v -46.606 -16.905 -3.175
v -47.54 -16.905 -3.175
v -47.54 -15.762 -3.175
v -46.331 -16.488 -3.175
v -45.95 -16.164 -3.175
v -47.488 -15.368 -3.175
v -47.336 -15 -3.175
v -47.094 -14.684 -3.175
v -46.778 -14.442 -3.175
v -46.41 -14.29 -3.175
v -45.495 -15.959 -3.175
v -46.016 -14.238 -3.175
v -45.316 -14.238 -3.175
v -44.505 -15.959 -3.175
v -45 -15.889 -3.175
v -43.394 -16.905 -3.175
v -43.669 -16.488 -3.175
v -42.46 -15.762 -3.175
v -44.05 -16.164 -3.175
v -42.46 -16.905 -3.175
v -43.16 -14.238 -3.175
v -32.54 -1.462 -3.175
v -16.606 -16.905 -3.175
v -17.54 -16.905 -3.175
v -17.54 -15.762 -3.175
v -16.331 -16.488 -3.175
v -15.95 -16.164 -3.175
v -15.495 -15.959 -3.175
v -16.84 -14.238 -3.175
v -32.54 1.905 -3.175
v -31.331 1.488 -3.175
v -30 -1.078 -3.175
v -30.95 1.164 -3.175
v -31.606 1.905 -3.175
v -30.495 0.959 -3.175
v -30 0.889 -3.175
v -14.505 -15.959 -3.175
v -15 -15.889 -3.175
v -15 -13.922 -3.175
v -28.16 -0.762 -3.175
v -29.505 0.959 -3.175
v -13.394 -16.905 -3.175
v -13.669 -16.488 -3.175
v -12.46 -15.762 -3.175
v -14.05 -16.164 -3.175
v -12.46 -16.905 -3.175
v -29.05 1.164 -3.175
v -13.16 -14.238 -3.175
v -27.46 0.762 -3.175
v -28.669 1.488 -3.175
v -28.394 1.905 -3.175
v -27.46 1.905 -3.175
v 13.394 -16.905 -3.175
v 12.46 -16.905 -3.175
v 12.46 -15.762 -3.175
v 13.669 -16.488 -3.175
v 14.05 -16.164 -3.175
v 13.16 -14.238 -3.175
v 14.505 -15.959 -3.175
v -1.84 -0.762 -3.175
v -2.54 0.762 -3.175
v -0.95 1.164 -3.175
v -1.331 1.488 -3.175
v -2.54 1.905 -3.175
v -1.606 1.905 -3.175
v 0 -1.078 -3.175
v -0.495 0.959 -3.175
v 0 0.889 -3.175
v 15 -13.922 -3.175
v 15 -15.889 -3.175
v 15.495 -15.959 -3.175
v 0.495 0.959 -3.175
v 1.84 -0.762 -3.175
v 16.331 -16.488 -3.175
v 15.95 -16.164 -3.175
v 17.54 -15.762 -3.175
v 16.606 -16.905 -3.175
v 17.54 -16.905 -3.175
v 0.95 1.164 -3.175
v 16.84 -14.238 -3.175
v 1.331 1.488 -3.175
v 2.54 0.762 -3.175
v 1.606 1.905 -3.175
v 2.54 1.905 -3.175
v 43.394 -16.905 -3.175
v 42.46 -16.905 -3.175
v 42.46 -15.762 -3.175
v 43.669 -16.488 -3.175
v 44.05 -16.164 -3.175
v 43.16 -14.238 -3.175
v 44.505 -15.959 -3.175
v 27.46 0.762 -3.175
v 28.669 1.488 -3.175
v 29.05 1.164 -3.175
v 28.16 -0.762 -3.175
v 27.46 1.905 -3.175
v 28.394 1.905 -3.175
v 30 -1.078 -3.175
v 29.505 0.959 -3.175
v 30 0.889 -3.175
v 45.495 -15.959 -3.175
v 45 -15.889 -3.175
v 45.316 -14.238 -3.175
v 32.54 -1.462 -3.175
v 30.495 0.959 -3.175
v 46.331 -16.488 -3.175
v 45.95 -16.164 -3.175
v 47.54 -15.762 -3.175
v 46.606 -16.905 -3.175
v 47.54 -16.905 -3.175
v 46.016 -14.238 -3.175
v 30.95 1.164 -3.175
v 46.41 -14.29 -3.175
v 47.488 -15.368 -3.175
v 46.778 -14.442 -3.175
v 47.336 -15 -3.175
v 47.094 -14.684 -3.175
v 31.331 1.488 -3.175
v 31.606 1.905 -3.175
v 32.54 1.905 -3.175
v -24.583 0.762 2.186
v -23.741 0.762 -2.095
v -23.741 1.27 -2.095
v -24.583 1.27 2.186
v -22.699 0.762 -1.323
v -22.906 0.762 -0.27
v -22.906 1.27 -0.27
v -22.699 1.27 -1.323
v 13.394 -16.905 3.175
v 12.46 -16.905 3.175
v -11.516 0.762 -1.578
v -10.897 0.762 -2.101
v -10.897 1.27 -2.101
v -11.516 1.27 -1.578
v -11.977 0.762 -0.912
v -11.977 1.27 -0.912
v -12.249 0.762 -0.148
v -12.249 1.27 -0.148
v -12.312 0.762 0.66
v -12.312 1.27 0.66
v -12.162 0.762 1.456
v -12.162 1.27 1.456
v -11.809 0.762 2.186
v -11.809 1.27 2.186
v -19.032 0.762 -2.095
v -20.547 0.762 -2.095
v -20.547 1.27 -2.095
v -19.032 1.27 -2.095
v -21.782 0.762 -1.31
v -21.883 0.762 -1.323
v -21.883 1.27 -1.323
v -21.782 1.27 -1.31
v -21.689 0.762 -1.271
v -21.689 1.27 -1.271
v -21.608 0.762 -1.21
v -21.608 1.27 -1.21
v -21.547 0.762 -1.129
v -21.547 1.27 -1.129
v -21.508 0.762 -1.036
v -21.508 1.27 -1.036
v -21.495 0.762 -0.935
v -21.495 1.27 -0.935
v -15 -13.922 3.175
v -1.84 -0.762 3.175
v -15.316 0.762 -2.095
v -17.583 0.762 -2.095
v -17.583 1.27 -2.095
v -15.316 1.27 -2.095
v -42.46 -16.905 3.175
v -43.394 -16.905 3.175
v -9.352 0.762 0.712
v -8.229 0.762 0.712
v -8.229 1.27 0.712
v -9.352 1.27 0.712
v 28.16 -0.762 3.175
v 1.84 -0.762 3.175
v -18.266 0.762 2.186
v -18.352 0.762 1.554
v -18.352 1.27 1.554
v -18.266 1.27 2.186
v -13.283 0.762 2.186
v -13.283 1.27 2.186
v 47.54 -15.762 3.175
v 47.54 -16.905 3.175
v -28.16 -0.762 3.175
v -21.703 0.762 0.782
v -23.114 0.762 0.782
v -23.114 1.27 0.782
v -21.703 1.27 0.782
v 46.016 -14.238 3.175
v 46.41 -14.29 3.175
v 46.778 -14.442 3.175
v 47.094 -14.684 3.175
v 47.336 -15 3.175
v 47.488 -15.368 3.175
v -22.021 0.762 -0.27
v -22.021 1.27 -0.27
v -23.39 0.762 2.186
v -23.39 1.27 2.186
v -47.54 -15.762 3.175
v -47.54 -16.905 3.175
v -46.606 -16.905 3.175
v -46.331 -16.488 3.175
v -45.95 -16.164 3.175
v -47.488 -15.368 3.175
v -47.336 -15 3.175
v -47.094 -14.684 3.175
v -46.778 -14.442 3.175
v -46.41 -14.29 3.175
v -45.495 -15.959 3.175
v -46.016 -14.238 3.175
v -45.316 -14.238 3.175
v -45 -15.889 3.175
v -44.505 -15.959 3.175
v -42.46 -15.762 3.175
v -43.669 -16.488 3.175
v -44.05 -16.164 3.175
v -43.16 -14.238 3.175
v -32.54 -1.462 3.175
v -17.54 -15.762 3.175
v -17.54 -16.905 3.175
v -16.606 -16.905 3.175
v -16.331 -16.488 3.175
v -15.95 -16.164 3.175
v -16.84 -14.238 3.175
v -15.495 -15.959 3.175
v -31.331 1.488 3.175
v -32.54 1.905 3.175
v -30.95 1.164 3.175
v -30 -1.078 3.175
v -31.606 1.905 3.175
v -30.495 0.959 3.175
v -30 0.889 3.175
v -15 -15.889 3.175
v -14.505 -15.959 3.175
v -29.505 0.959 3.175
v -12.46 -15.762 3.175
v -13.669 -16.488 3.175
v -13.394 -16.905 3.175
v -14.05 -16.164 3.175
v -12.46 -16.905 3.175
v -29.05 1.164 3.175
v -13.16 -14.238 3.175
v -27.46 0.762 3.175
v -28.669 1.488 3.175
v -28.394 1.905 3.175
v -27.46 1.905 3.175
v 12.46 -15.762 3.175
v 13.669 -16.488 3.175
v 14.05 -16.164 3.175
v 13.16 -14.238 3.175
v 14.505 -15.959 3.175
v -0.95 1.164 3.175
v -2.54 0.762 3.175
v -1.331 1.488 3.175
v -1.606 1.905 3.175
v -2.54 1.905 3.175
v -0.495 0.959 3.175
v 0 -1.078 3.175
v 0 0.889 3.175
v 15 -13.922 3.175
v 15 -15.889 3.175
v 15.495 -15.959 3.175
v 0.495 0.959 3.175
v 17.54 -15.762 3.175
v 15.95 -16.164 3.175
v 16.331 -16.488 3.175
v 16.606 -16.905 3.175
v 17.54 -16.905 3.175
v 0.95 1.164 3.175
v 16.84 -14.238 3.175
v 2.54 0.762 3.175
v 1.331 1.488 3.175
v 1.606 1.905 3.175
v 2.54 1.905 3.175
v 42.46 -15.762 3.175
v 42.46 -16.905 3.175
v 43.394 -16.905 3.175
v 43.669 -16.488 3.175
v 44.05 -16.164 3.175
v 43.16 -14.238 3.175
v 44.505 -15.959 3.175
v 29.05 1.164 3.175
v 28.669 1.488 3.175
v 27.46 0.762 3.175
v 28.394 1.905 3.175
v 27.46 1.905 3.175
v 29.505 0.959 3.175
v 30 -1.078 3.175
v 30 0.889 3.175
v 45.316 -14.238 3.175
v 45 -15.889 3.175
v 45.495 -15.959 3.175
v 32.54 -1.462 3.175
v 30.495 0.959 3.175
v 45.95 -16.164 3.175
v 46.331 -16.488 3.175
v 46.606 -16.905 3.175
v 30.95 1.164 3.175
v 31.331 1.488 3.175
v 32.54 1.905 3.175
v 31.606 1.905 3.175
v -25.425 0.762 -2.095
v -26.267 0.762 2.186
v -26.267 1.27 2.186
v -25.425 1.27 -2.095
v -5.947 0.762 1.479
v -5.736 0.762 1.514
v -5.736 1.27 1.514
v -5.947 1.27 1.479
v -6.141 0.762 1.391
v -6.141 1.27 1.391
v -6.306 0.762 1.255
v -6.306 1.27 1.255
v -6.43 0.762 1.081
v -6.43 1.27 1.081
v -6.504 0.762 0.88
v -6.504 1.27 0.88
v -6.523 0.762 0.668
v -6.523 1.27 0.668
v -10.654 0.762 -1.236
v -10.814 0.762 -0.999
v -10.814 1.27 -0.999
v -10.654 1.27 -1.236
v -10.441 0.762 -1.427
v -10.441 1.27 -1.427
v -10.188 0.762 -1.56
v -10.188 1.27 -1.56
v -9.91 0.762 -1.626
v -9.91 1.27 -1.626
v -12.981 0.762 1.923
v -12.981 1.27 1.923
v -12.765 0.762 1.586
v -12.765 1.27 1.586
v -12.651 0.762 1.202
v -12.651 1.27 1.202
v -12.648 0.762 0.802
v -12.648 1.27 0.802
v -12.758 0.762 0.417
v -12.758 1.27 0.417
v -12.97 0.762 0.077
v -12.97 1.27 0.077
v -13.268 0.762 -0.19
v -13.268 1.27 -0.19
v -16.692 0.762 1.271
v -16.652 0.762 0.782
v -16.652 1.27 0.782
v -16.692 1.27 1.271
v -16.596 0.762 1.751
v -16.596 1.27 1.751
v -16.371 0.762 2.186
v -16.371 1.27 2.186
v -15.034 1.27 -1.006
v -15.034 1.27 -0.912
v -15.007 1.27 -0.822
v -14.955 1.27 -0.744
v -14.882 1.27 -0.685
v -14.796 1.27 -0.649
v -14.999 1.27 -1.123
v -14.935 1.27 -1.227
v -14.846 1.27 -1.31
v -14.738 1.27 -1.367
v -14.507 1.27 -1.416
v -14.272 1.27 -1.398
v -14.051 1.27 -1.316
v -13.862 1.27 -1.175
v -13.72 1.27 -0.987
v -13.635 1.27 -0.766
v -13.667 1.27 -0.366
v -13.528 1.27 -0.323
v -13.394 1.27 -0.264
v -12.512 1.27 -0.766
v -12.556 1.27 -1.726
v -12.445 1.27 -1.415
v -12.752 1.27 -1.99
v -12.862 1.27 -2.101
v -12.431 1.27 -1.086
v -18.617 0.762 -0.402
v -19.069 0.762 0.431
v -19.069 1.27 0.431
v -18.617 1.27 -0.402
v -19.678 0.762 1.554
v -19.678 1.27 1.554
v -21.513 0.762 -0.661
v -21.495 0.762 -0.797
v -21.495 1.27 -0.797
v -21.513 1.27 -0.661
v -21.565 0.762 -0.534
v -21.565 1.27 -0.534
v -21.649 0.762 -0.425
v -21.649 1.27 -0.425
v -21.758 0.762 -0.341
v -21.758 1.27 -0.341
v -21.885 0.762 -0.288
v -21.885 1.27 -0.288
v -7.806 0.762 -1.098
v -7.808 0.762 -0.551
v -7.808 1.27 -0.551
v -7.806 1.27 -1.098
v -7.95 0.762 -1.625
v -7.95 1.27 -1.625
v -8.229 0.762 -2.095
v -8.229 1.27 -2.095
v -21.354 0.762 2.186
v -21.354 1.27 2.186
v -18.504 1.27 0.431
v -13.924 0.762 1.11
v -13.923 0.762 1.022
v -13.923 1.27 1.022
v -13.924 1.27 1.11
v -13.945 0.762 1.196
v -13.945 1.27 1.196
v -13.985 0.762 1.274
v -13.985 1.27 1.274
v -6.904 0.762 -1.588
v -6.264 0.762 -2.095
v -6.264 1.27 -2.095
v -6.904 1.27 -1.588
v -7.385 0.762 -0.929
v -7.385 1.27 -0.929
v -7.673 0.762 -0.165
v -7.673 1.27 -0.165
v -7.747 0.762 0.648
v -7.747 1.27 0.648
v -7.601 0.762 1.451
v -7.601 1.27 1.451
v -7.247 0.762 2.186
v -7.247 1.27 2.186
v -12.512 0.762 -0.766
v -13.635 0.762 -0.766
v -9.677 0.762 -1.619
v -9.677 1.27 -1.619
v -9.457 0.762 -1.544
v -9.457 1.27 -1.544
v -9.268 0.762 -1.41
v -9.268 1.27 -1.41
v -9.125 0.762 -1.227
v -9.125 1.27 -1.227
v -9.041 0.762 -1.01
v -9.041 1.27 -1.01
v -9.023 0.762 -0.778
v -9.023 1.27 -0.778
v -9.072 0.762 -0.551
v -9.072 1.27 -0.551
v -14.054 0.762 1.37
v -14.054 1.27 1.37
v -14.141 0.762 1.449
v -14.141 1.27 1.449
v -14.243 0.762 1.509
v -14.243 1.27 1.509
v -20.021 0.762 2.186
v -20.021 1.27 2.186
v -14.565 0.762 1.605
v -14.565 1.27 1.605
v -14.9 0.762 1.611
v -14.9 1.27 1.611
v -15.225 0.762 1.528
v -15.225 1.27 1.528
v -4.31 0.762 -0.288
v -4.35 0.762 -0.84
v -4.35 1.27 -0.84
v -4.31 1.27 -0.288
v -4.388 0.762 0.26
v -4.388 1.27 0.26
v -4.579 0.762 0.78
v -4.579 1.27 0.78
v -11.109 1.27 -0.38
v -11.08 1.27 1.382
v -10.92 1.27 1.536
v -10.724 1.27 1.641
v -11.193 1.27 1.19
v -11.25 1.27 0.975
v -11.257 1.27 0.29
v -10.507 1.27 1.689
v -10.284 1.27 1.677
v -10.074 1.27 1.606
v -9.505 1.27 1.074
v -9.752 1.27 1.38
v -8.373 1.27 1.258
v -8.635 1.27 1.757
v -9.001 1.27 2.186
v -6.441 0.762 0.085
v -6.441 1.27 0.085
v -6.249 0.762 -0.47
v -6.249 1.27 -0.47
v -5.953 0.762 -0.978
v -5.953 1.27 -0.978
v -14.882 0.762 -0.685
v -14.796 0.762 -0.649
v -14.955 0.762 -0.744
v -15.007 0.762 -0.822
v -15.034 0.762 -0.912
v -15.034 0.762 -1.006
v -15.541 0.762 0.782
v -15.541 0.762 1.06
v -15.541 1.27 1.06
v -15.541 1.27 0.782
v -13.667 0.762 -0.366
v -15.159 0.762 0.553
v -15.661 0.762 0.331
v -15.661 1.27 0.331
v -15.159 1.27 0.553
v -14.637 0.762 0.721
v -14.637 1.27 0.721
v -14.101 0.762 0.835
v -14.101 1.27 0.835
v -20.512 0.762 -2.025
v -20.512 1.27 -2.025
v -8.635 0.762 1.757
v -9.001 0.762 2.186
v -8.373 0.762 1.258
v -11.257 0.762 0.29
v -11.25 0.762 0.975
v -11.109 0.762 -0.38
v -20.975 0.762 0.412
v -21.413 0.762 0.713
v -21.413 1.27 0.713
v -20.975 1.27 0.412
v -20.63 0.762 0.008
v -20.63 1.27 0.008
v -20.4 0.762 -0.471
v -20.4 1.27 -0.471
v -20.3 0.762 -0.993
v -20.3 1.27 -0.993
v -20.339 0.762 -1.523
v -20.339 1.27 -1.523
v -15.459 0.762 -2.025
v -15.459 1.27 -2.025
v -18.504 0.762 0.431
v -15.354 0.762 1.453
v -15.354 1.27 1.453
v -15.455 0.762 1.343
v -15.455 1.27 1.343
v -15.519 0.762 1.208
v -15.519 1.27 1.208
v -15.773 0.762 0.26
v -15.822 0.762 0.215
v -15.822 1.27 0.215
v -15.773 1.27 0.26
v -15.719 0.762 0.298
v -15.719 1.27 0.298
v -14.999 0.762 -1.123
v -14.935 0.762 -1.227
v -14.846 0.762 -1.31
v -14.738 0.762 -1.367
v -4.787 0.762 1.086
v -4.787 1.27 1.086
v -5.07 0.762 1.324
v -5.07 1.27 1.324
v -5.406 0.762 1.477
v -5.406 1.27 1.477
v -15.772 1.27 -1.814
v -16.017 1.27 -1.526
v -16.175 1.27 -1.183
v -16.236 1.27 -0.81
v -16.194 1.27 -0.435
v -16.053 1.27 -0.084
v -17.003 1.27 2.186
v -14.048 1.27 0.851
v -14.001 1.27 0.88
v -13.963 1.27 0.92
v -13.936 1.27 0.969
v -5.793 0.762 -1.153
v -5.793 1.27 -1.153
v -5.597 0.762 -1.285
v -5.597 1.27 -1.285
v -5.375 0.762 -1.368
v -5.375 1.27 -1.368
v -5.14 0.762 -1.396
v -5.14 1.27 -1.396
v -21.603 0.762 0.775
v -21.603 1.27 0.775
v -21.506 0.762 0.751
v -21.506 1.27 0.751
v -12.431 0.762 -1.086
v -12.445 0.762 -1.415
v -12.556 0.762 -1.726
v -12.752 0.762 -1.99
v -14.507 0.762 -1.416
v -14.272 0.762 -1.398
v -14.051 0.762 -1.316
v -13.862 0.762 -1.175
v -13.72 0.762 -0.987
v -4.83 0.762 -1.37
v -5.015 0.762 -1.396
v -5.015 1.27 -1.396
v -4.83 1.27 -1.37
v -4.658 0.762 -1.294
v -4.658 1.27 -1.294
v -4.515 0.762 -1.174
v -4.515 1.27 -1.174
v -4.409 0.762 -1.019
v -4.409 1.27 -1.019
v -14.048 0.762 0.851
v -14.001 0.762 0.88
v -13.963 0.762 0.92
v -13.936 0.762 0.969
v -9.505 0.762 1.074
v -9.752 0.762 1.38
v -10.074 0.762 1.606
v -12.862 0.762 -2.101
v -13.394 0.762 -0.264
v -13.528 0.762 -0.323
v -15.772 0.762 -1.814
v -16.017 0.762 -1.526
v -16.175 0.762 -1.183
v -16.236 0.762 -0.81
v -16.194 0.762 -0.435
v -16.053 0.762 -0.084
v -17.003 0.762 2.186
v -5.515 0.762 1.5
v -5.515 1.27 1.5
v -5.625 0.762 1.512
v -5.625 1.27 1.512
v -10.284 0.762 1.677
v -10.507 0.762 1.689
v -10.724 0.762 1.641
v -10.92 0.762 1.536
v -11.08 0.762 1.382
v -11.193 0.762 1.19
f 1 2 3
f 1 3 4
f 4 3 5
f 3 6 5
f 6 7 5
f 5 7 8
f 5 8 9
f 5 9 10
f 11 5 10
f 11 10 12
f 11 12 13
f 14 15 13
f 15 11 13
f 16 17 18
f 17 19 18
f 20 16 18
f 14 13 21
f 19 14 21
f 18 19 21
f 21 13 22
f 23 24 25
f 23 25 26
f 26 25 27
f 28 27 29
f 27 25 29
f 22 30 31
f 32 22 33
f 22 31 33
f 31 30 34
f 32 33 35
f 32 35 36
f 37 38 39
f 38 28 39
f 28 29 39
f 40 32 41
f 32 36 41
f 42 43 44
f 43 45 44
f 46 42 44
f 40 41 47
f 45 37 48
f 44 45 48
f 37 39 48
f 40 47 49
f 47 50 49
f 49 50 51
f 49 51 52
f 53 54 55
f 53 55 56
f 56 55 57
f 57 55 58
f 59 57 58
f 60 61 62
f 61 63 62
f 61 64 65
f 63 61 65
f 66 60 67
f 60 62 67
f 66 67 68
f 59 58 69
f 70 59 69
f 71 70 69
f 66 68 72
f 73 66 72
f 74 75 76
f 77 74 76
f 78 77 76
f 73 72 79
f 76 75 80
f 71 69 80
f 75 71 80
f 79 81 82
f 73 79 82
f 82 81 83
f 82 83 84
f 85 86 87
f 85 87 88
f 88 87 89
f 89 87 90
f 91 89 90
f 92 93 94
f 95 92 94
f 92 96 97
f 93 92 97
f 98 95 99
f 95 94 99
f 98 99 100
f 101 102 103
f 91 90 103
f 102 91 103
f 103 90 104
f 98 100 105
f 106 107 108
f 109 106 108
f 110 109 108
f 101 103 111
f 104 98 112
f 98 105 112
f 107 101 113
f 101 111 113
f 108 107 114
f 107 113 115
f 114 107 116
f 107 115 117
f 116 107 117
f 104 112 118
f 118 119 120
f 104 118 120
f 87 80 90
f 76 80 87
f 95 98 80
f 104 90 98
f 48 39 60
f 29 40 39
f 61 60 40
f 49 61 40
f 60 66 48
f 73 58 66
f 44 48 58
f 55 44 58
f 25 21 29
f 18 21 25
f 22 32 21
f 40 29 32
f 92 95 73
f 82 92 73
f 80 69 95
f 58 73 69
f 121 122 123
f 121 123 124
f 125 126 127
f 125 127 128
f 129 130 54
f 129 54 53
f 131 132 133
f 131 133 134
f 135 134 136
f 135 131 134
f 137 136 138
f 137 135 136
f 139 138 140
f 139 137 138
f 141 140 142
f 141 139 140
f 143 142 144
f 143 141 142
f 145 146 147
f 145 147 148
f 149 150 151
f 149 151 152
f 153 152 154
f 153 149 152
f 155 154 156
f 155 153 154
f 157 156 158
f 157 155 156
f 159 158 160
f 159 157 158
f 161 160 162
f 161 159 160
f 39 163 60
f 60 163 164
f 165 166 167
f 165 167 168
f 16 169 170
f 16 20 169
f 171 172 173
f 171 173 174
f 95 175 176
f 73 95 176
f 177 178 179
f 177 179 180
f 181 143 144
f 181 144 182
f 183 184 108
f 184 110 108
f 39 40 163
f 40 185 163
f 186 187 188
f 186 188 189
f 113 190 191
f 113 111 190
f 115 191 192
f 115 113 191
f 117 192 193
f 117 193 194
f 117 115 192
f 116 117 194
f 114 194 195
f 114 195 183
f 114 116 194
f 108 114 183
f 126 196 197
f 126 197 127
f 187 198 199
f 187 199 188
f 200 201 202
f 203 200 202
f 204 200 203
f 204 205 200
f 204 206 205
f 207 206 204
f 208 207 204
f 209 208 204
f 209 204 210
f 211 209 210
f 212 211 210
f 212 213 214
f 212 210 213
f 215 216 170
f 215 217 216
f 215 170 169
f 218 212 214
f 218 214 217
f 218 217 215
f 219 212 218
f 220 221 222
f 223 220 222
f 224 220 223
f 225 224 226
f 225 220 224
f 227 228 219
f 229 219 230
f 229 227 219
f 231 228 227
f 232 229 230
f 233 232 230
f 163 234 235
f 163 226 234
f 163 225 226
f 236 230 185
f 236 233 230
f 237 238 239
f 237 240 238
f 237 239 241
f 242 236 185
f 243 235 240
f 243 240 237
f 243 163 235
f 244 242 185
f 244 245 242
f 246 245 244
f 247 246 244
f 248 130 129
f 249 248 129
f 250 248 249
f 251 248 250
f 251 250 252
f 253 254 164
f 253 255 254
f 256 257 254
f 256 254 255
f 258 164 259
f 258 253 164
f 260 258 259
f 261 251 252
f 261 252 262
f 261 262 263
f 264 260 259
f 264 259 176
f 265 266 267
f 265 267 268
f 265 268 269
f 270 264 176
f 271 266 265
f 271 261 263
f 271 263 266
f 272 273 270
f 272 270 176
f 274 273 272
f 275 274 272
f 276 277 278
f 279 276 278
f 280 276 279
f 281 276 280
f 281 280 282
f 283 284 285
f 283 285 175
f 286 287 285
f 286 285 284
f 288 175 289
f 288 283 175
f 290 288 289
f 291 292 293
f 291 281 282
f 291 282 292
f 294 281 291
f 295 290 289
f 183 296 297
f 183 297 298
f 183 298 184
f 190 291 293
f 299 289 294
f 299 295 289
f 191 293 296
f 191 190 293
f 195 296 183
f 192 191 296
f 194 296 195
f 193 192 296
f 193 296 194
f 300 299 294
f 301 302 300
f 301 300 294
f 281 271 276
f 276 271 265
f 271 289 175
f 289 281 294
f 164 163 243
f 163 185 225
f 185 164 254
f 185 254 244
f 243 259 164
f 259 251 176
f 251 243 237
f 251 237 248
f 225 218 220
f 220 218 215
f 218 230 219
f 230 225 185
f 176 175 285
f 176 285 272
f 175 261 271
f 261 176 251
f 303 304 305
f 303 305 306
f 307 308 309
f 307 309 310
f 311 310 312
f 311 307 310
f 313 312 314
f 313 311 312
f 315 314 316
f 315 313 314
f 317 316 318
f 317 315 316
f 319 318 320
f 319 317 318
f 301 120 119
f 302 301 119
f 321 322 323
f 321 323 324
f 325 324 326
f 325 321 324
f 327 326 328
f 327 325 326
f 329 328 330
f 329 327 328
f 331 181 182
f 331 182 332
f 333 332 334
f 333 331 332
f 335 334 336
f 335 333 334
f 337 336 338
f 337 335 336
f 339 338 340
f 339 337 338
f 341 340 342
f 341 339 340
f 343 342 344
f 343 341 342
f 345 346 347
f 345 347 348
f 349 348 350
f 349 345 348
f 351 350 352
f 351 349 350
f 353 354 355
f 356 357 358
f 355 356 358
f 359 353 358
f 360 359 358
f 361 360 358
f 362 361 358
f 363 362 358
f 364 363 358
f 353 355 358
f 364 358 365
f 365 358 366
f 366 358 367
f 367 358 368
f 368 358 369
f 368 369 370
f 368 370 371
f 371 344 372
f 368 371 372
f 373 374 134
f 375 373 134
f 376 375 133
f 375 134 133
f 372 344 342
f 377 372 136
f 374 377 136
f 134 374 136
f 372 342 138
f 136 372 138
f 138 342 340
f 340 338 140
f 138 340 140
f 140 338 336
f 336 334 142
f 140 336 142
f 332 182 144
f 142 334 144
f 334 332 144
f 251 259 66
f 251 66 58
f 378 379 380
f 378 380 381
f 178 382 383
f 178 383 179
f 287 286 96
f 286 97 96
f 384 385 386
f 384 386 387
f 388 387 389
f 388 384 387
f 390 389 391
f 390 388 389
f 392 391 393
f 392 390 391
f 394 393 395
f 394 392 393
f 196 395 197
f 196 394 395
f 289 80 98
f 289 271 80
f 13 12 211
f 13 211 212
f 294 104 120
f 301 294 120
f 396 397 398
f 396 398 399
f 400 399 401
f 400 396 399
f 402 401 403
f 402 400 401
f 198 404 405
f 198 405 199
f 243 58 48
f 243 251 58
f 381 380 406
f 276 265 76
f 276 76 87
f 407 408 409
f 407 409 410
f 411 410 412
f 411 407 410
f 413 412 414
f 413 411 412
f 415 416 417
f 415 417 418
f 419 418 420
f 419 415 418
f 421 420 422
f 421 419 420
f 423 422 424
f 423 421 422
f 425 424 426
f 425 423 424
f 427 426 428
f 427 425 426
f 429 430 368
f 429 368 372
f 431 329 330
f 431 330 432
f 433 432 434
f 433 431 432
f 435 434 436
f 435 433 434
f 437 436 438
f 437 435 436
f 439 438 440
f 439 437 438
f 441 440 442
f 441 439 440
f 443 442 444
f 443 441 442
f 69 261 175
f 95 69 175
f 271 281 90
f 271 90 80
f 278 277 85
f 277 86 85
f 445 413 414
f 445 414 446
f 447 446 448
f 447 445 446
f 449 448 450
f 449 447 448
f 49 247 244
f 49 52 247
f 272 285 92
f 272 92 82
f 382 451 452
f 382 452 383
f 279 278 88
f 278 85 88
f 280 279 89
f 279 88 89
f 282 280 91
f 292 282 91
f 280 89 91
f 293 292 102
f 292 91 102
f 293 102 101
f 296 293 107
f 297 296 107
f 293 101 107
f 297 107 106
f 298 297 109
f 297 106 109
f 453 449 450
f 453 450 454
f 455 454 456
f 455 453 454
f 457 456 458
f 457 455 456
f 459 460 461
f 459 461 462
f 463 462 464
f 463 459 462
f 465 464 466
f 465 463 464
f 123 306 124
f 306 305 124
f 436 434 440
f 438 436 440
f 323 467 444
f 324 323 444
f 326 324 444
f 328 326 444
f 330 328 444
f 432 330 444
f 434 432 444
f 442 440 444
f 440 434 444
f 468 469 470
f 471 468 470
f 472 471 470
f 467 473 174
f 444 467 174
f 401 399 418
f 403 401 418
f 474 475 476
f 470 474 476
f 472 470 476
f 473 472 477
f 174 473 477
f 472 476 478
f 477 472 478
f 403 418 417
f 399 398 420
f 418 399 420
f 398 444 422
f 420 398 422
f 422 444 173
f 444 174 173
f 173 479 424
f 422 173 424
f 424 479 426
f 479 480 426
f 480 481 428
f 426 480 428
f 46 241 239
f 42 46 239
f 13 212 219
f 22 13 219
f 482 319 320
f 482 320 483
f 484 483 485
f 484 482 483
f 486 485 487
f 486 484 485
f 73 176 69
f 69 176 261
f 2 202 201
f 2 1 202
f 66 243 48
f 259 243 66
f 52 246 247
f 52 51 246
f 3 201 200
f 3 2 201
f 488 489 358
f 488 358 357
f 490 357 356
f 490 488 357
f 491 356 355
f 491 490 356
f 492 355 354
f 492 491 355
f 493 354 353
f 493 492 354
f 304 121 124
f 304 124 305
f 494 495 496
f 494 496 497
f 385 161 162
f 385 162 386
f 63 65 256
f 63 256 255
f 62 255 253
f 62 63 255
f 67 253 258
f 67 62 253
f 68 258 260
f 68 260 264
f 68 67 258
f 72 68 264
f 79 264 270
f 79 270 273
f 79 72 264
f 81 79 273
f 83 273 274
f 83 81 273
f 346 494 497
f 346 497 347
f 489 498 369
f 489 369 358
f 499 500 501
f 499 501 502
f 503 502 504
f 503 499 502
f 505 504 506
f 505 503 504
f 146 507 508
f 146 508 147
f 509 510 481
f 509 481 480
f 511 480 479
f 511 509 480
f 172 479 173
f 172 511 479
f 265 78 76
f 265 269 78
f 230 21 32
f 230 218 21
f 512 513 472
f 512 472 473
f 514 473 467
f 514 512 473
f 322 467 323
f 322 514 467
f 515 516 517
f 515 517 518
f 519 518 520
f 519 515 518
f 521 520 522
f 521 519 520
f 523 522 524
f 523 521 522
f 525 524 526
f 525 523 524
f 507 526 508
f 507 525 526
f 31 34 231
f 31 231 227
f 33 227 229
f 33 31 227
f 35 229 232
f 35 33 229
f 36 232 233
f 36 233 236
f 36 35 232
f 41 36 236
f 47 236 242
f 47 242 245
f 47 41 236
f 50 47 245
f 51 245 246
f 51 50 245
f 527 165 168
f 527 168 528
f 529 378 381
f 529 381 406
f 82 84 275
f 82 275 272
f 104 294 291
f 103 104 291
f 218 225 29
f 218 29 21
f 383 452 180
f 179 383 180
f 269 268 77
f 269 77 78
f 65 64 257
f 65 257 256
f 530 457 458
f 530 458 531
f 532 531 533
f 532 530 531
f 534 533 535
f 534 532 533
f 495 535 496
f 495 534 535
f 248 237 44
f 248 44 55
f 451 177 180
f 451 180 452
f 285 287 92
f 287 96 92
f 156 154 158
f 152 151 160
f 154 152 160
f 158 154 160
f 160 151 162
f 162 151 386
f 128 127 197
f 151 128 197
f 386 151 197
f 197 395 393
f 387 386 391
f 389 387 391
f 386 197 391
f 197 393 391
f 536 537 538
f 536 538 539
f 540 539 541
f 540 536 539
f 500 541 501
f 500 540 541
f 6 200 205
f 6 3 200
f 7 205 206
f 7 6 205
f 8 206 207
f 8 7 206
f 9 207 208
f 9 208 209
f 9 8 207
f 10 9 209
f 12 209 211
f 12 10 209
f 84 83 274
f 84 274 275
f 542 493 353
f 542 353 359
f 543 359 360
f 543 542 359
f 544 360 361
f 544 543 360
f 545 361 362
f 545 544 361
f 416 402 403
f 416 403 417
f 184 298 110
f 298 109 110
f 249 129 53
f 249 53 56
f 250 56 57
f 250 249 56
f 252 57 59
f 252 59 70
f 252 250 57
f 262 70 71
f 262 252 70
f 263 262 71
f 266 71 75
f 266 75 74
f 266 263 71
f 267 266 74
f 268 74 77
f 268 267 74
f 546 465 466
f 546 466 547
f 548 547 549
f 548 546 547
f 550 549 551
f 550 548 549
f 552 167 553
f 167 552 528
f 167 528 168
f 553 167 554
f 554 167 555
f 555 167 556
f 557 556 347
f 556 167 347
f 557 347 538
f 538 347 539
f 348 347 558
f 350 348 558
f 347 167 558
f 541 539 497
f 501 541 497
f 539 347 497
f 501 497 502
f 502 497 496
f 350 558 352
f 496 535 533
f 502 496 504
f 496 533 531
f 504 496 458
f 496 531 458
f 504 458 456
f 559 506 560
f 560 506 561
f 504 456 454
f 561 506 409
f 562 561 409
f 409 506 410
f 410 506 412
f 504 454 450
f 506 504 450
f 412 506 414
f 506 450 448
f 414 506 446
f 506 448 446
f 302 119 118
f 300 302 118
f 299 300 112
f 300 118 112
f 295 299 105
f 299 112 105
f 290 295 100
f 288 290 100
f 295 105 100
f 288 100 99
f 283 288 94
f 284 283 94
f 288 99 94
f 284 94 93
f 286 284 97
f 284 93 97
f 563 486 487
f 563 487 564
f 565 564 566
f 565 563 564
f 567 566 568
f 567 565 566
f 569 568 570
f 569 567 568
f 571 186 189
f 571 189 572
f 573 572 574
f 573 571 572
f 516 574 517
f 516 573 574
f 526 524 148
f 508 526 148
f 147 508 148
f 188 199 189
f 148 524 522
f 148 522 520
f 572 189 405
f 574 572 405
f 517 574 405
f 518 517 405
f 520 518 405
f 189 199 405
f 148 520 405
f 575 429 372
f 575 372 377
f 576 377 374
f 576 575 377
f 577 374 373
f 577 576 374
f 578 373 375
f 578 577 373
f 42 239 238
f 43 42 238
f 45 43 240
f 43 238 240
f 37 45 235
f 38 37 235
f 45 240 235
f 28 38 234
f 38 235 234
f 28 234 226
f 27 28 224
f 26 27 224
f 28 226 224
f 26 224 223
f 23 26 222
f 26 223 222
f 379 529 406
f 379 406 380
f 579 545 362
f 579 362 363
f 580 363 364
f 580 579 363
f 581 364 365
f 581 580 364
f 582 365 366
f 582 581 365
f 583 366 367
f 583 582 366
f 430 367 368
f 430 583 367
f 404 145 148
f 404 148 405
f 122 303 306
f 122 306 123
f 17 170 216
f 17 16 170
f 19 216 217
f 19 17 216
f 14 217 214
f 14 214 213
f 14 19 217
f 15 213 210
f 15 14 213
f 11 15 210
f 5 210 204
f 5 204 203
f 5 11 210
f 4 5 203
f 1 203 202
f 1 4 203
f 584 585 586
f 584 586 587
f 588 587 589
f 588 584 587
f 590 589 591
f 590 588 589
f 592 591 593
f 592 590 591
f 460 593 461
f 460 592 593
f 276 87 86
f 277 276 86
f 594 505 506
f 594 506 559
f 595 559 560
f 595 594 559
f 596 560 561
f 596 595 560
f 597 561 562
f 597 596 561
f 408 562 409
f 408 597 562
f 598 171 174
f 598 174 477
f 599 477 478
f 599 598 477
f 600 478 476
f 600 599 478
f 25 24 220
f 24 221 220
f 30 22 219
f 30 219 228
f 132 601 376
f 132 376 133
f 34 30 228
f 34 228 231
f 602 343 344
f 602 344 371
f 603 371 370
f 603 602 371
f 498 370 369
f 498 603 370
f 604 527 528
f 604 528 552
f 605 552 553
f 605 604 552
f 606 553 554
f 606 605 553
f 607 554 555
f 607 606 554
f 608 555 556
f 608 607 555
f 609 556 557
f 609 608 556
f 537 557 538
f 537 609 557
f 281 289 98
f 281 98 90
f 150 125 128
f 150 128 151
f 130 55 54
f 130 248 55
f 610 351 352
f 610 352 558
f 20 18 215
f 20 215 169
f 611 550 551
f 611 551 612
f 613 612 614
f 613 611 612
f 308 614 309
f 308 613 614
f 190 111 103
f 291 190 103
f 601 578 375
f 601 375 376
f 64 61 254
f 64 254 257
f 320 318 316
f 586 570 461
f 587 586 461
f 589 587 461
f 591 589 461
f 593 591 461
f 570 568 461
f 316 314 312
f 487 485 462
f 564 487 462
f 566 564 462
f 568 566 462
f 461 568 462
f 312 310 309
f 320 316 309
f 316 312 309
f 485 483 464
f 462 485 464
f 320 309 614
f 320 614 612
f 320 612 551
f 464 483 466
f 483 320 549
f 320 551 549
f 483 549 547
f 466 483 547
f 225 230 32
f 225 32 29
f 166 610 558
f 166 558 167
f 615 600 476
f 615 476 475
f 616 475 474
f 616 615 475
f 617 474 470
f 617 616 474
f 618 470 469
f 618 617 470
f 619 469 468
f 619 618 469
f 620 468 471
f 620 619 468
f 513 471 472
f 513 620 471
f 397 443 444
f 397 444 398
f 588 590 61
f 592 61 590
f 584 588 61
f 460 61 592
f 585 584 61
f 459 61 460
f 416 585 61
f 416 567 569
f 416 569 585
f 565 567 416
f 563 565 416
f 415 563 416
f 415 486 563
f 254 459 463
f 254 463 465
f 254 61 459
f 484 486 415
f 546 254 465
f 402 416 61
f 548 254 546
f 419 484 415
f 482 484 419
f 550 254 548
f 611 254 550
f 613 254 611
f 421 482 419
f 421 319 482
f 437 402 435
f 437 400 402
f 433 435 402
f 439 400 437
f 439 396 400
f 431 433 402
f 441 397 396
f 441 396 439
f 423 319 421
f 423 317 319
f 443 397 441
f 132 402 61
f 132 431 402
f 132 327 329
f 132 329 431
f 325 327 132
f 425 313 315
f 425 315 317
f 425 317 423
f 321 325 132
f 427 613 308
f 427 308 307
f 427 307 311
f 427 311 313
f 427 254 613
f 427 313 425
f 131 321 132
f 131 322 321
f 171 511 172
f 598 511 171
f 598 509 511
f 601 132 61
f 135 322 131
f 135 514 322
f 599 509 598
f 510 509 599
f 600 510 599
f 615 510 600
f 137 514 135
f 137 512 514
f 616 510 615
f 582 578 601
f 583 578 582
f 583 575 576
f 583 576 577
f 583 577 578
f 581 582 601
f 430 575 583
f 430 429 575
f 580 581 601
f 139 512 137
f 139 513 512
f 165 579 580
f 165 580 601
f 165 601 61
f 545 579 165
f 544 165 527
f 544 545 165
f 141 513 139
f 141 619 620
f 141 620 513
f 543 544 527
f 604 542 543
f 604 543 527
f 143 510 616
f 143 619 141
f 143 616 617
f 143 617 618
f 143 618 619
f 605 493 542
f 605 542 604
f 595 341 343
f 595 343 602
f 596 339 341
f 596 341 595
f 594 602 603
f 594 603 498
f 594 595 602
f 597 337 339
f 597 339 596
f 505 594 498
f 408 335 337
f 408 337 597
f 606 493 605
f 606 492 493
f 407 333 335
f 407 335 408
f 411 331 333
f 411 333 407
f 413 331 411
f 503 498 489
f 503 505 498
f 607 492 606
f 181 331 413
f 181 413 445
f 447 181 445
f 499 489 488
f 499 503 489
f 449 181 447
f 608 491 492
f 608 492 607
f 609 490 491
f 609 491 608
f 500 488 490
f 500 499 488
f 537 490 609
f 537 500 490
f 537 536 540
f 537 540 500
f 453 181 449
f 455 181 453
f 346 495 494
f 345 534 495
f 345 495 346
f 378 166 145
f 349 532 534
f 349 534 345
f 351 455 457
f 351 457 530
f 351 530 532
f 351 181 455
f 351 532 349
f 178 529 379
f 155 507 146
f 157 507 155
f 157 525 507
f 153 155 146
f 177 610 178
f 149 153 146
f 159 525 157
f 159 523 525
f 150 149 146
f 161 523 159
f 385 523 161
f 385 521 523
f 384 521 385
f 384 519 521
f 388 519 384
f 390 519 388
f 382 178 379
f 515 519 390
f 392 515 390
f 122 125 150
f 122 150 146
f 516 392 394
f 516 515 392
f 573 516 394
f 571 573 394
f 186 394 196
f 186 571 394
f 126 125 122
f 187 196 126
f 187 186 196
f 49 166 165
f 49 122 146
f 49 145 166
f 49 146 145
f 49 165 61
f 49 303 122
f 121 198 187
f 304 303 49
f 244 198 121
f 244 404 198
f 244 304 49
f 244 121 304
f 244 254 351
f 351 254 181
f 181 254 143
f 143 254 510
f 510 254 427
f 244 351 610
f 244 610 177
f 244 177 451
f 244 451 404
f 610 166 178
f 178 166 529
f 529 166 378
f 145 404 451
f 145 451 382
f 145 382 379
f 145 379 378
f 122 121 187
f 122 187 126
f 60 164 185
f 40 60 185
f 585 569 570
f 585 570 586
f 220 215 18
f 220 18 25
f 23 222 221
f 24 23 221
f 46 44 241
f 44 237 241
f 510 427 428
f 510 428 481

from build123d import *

# Parameters (mm, degrees)
BOSS_EXTRUDE1_DEPTH  = 3.175
BOSS_EXTRUDE2_DEPTH  = 3.175
BOSS_EXTRUDE3_START  = -3.175
BOSS_EXTRUDE3_DEPTH  = 6.35
FILLET1_R            = 1.524
FILLET1_OF_MIRROR1_R = 1.524
BOSS_EXTRUDE4_DEPTH  = 0.508


with BuildPart() as part:
    # Sketch1 → Boss-Extrude1 (new body, symmetric)
    with BuildSketch(Plane.XY):
        Polygon((-46.839630735, -15.762), (-30.315630735, 0.762), (0, 0.762), (30.315630735, 0.762), (46.839630735, -15.762), (15, -15.762), (-15, -15.762), align=None)
        Polygon((-43.160369265, -14.238), (-30, -1.077630735), (-16.839630735, -14.238), align=None, mode=Mode.SUBTRACT)
        Polygon((-28.160369265, -0.762), (-15, -13.922369265), (-1.839630735, -0.762), align=None, mode=Mode.SUBTRACT)
        Polygon((-13.160369265, -14.238), (0, -1.077630735), (13.160369265, -14.238), align=None, mode=Mode.SUBTRACT)
        Polygon((1.839630735, -0.762), (15, -13.922369265), (28.160369265, -0.762), align=None, mode=Mode.SUBTRACT)
        Polygon((16.839630735, -14.238), (30, -1.077630735), (43.160369265, -14.238), align=None, mode=Mode.SUBTRACT)
    extrude(amount=BOSS_EXTRUDE1_DEPTH, both=True)

    # Sketch2 → Boss-Extrude2 (add, symmetric)
    with BuildSketch(Plane.XY):
        with BuildLine():
            Line((-46.606437051, -16.905), (-47.54, -16.905))
            Line((-47.54, -16.905), (-47.54, -14.238))
            Line((-47.54, -14.238), (-42.46, -14.238))
            Line((-42.46, -14.238), (-42.46, -16.905))
            Line((-42.46, -16.905), (-43.393562949, -16.905))
            ThreePointArc((-43.393562949, -16.905), (-45, -15.889), (-46.606437051, -16.905))
        make_face()
        with BuildLine():
            Line((-27.46, 0.762), (-30.315630735, 0.762))
            Line((-30.315630735, 0.762), (-32.54, -1.462369265))
            Line((-32.54, -1.462369265), (-32.54, 0.762))
            Line((-32.54, 0.762), (-32.54, 1.905))
            Line((-32.54, 1.905), (-31.606437051, 1.905))
            ThreePointArc((-31.606437051, 1.905), (-30, 0.889), (-28.393562949, 1.905))
            Line((-28.393562949, 1.905), (-27.46, 1.905))
            Line((-27.46, 1.905), (-27.46, 0.762))
        make_face()
        with BuildLine():
            Line((-16.606437051, -16.905), (-17.54, -16.905))
            Line((-17.54, -16.905), (-17.54, -15.762))
            Line((-17.54, -15.762), (-12.46, -15.762))
            Line((-12.46, -15.762), (-12.46, -16.905))
            Line((-12.46, -16.905), (-13.393562949, -16.905))
            ThreePointArc((-13.393562949, -16.905), (-15, -15.889), (-16.606437051, -16.905))
        make_face()
    boss_extrude2 = extrude(amount=BOSS_EXTRUDE2_DEPTH, both=True)

    # Sketch3 → Boss-Extrude3 (add)
    with BuildSketch(Plane.XY.offset(BOSS_EXTRUDE3_START)):
        with BuildLine():
            Line((1.606437051, 1.905), (2.54, 1.905))
            Line((2.54, 1.905), (2.54, 0.762))
            Line((2.54, 0.762), (-2.54, 0.762))
            Line((-2.54, 0.762), (-2.54, 1.905))
            Line((-2.54, 1.905), (-1.606437051, 1.905))
            ThreePointArc((-1.606437051, 1.905), (0, 0.889), (1.606437051, 1.905))
        make_face()
    extrude(amount=BOSS_EXTRUDE3_DEPTH)

    # Fillet1
    fillet1_edges = [part.edges().sort_by_distance(p)[0] for p in [
        (-47.54, -14.238, 0),
    ]]
    fillet(fillet1_edges, radius=FILLET1_R)

    # Mirror1: Boss-Extrude2 across plane
    add(boss_extrude2.mirror(Plane(origin=(0, 0, 0), x_dir=(0, 0, 1), z_dir=(1, 0, 0))))

    # Fillet1 of Mirror1
    fillet1_of_mirror1_edges = [part.edges().sort_by_distance(p)[0] for p in [
        (47.54, -14.238, 0),
    ]]
    fillet(fillet1_of_mirror1_edges, radius=FILLET1_OF_MIRROR1_R)

    # Sketch4 → Boss-Extrude4 (add)
    with BuildSketch(Plane(origin=(30.341470111, 0.762, -10.998323426), x_dir=(-1, 0, 0), z_dir=(0, 1, 0))):
        Polygon((55.766638301, 8.903049935), (54.0821519, 8.903049935), (54.924395101, 13.184452869), (56.608881501, 13.184452869), align=None)
        with BuildLine():
            Line((49.373679321, 8.903049935), (51.695796166, 13.184452869))
            Line((51.695796166, 13.184452869), (53.731217234, 13.184452869))
            Line((53.731217234, 13.184452869), (53.455071922, 11.780714202))
            Line((53.455071922, 11.780714202), (52.044845481, 11.780714202))
            ThreePointArc((52.044845481, 11.780714202), (51.895660414, 11.763021636), (51.754751921, 11.710925494))
            ThreePointArc((51.754751921, 11.710925494), (50.74099205, 10.52746368), (50.853552966, 8.973236868))
            Line((50.853552966, 8.973236868), (50.888554794, 8.903049935))
            Line((50.888554794, 8.903049935), (49.373679321, 8.903049935))
        make_face()
        with BuildLine():
            Line((47.344206299, 13.184452869), (47.92473551, 8.903049935))
            Line((47.92473551, 8.903049935), (45.657455804, 8.903049935))
            Line((45.657455804, 8.903049935), (45.800093765, 8.973236868))
            ThreePointArc((45.800093765, 8.973236868), (46.559919921, 9.999679495), (46.16385217, 11.213784347))
            ThreePointArc((46.16385217, 11.213784347), (46.087708374, 11.278047887), (46.002485287, 11.329668676))
            ThreePointArc((46.002485287, 11.329668676), (45.241879319, 11.641820064), (44.44239948, 11.833632247))
            ThreePointArc((44.44239948, 11.833632247), (44.321830206, 11.897125178), (44.264573877, 12.020777977))
            ThreePointArc((44.264573877, 12.020777977), (44.273299822, 12.151811254), (44.326168164, 12.272022736))
            ThreePointArc((44.326168164, 12.272022736), (44.436687002, 12.409847066), (44.584321098, 12.50687352))
            ThreePointArc((44.584321098, 12.50687352), (45.07356558, 12.617554773), (45.566896159, 12.526805434))
            ThreePointArc((45.566896159, 12.526805434), (45.796502387, 12.340831934), (45.882880346, 12.05826511))
            Line((45.882880346, 12.05826511), (45.882880346, 11.780714202))
            Line((45.882880346, 11.780714202), (46.993271632, 11.780714202))
            ThreePointArc((46.993271632, 11.780714202), (47.00184458, 12.512372899), (46.712523898, 13.184452869))
            Line((46.712523898, 13.184452869), (47.344206299, 13.184452869))
        make_face()
        with BuildLine():
            Line((52.362572033, 10.727910202), (53.247962938, 10.727910202))
            Line((53.247962938, 10.727910202), (53.040853955, 9.675106202))
            Line((53.040853955, 9.675106202), (52.224130208, 9.675106202))
            ThreePointArc((52.224130208, 9.675106202), (51.949800938, 9.788737106), (51.836170033, 10.063066377))
            Line((51.836170033, 10.063066377), (51.836170033, 10.201508202))
            ThreePointArc((51.836170033, 10.201508202), (51.990349609, 10.573730626), (52.362572033, 10.727910202))
        make_face()
        Polygon((48.958505766, 10.596309702), (48.845492907, 11.429779536), (49.410557201, 11.429779536), align=None)
        Polygon((48.607571099, 13.184452869), (50.362244433, 13.184452869), (50.019637029, 12.552770469), (48.69322295, 12.552770469), align=None)
        with BuildLine():
            Line((43.093358174, 9.007864255), (43.203837606, 8.897384823))
            Line((43.203837606, 8.897384823), (41.238603472, 8.897384823))
            ThreePointArc((41.238603472, 8.897384823), (42.59037643, 10.850382179), (42.150373231, 13.184452869))
            Line((42.150373231, 13.184452869), (43.624298831, 13.184452869))
            ThreePointArc((43.624298831, 13.184452869), (42.976922737, 12.00046329), (43.609533036, 10.808518937))
            ThreePointArc((43.609533036, 10.808518937), (43.801404112, 10.703005905), (44.00849344, 10.63186155))
            Line((44.00849344, 10.63186155), (45.137184548, 10.349688773))
            ThreePointArc((45.137184548, 10.349688773), (45.325274084, 10.217067986), (45.375126192, 9.992388851))
            ThreePointArc((45.375126192, 9.992388851), (45.276758726, 9.771226443), (45.079326395, 9.631192719))
            ThreePointArc((45.079326395, 9.631192719), (44.392498989, 9.682709209), (43.976922089, 10.231964773))
            Line((43.976922089, 10.231964773), (42.853931155, 10.231964773))
            ThreePointArc((42.853931155, 10.231964773), (42.786913393, 9.583390951), (43.093358174, 9.007864255))
        make_face()
        with BuildLine():
            Line((38.57083963, 8.903049935), (36.605605496, 8.903049935))
            ThreePointArc((36.605605496, 8.903049935), (38.014670833, 10.833118693), (37.588222563, 13.184452869))
            Line((37.588222563, 13.184452869), (39.342895896, 13.184452869))
            ThreePointArc((39.342895896, 13.184452869), (38.831372076, 12.513225905), (38.57083963, 11.710527269))
            Line((38.57083963, 11.710527269), (39.693830563, 11.710527269))
            ThreePointArc((39.693830563, 11.710527269), (39.959617235, 12.233880985), (40.415270694, 12.603910164))
            ThreePointArc((40.415270694, 12.603910164), (41.166876497, 12.593701608), (41.591788981, 11.973649288))
            ThreePointArc((41.591788981, 11.973649288), (41.543037796, 10.949193829), (41.155213354, 9.999731945))
            ThreePointArc((41.155213354, 9.999731945), (40.782487914, 9.571566118), (40.251107207, 9.371854393))
            ThreePointArc((40.251107207, 9.371854393), (39.531077174, 9.674914925), (39.41308283, 10.447162469))
            Line((39.41308283, 10.447162469), (38.149718029, 10.447162469))
            ThreePointArc((38.149718029, 10.447162469), (38.201808334, 9.631886976), (38.57083963, 8.903049935))
        make_face()
        with BuildLine():
            Line((35.48104333, 9.602571887), (35.356873428, 9.602571887))
            ThreePointArc((35.356873428, 9.602571887), (34.923728887, 9.759646665), (34.691948891, 10.157848515))
            ThreePointArc((34.691948891, 10.157848515), (34.675735454, 10.986379145), (34.920455715, 11.778110082))
            ThreePointArc((34.920455715, 11.778110082), (35.261440878, 12.213116508), (35.747757566, 12.475790357))
            ThreePointArc((35.747757566, 12.475790357), (35.911443016, 12.505405638), (36.077655631, 12.511990293))
            ThreePointArc((36.077655631, 12.511990293), (36.647671195, 12.253324316), (36.864077445, 11.665962276))
            ThreePointArc((36.864077445, 11.665962276), (36.699639375, 10.801331502), (36.294750409, 10.019864179))
            ThreePointArc((36.294750409, 10.019864179), (35.938277424, 9.712977507), (35.48104333, 9.602571887))
        make_face()
    extrude(amount=BOSS_EXTRUDE4_DEPTH)


solid = part.part
